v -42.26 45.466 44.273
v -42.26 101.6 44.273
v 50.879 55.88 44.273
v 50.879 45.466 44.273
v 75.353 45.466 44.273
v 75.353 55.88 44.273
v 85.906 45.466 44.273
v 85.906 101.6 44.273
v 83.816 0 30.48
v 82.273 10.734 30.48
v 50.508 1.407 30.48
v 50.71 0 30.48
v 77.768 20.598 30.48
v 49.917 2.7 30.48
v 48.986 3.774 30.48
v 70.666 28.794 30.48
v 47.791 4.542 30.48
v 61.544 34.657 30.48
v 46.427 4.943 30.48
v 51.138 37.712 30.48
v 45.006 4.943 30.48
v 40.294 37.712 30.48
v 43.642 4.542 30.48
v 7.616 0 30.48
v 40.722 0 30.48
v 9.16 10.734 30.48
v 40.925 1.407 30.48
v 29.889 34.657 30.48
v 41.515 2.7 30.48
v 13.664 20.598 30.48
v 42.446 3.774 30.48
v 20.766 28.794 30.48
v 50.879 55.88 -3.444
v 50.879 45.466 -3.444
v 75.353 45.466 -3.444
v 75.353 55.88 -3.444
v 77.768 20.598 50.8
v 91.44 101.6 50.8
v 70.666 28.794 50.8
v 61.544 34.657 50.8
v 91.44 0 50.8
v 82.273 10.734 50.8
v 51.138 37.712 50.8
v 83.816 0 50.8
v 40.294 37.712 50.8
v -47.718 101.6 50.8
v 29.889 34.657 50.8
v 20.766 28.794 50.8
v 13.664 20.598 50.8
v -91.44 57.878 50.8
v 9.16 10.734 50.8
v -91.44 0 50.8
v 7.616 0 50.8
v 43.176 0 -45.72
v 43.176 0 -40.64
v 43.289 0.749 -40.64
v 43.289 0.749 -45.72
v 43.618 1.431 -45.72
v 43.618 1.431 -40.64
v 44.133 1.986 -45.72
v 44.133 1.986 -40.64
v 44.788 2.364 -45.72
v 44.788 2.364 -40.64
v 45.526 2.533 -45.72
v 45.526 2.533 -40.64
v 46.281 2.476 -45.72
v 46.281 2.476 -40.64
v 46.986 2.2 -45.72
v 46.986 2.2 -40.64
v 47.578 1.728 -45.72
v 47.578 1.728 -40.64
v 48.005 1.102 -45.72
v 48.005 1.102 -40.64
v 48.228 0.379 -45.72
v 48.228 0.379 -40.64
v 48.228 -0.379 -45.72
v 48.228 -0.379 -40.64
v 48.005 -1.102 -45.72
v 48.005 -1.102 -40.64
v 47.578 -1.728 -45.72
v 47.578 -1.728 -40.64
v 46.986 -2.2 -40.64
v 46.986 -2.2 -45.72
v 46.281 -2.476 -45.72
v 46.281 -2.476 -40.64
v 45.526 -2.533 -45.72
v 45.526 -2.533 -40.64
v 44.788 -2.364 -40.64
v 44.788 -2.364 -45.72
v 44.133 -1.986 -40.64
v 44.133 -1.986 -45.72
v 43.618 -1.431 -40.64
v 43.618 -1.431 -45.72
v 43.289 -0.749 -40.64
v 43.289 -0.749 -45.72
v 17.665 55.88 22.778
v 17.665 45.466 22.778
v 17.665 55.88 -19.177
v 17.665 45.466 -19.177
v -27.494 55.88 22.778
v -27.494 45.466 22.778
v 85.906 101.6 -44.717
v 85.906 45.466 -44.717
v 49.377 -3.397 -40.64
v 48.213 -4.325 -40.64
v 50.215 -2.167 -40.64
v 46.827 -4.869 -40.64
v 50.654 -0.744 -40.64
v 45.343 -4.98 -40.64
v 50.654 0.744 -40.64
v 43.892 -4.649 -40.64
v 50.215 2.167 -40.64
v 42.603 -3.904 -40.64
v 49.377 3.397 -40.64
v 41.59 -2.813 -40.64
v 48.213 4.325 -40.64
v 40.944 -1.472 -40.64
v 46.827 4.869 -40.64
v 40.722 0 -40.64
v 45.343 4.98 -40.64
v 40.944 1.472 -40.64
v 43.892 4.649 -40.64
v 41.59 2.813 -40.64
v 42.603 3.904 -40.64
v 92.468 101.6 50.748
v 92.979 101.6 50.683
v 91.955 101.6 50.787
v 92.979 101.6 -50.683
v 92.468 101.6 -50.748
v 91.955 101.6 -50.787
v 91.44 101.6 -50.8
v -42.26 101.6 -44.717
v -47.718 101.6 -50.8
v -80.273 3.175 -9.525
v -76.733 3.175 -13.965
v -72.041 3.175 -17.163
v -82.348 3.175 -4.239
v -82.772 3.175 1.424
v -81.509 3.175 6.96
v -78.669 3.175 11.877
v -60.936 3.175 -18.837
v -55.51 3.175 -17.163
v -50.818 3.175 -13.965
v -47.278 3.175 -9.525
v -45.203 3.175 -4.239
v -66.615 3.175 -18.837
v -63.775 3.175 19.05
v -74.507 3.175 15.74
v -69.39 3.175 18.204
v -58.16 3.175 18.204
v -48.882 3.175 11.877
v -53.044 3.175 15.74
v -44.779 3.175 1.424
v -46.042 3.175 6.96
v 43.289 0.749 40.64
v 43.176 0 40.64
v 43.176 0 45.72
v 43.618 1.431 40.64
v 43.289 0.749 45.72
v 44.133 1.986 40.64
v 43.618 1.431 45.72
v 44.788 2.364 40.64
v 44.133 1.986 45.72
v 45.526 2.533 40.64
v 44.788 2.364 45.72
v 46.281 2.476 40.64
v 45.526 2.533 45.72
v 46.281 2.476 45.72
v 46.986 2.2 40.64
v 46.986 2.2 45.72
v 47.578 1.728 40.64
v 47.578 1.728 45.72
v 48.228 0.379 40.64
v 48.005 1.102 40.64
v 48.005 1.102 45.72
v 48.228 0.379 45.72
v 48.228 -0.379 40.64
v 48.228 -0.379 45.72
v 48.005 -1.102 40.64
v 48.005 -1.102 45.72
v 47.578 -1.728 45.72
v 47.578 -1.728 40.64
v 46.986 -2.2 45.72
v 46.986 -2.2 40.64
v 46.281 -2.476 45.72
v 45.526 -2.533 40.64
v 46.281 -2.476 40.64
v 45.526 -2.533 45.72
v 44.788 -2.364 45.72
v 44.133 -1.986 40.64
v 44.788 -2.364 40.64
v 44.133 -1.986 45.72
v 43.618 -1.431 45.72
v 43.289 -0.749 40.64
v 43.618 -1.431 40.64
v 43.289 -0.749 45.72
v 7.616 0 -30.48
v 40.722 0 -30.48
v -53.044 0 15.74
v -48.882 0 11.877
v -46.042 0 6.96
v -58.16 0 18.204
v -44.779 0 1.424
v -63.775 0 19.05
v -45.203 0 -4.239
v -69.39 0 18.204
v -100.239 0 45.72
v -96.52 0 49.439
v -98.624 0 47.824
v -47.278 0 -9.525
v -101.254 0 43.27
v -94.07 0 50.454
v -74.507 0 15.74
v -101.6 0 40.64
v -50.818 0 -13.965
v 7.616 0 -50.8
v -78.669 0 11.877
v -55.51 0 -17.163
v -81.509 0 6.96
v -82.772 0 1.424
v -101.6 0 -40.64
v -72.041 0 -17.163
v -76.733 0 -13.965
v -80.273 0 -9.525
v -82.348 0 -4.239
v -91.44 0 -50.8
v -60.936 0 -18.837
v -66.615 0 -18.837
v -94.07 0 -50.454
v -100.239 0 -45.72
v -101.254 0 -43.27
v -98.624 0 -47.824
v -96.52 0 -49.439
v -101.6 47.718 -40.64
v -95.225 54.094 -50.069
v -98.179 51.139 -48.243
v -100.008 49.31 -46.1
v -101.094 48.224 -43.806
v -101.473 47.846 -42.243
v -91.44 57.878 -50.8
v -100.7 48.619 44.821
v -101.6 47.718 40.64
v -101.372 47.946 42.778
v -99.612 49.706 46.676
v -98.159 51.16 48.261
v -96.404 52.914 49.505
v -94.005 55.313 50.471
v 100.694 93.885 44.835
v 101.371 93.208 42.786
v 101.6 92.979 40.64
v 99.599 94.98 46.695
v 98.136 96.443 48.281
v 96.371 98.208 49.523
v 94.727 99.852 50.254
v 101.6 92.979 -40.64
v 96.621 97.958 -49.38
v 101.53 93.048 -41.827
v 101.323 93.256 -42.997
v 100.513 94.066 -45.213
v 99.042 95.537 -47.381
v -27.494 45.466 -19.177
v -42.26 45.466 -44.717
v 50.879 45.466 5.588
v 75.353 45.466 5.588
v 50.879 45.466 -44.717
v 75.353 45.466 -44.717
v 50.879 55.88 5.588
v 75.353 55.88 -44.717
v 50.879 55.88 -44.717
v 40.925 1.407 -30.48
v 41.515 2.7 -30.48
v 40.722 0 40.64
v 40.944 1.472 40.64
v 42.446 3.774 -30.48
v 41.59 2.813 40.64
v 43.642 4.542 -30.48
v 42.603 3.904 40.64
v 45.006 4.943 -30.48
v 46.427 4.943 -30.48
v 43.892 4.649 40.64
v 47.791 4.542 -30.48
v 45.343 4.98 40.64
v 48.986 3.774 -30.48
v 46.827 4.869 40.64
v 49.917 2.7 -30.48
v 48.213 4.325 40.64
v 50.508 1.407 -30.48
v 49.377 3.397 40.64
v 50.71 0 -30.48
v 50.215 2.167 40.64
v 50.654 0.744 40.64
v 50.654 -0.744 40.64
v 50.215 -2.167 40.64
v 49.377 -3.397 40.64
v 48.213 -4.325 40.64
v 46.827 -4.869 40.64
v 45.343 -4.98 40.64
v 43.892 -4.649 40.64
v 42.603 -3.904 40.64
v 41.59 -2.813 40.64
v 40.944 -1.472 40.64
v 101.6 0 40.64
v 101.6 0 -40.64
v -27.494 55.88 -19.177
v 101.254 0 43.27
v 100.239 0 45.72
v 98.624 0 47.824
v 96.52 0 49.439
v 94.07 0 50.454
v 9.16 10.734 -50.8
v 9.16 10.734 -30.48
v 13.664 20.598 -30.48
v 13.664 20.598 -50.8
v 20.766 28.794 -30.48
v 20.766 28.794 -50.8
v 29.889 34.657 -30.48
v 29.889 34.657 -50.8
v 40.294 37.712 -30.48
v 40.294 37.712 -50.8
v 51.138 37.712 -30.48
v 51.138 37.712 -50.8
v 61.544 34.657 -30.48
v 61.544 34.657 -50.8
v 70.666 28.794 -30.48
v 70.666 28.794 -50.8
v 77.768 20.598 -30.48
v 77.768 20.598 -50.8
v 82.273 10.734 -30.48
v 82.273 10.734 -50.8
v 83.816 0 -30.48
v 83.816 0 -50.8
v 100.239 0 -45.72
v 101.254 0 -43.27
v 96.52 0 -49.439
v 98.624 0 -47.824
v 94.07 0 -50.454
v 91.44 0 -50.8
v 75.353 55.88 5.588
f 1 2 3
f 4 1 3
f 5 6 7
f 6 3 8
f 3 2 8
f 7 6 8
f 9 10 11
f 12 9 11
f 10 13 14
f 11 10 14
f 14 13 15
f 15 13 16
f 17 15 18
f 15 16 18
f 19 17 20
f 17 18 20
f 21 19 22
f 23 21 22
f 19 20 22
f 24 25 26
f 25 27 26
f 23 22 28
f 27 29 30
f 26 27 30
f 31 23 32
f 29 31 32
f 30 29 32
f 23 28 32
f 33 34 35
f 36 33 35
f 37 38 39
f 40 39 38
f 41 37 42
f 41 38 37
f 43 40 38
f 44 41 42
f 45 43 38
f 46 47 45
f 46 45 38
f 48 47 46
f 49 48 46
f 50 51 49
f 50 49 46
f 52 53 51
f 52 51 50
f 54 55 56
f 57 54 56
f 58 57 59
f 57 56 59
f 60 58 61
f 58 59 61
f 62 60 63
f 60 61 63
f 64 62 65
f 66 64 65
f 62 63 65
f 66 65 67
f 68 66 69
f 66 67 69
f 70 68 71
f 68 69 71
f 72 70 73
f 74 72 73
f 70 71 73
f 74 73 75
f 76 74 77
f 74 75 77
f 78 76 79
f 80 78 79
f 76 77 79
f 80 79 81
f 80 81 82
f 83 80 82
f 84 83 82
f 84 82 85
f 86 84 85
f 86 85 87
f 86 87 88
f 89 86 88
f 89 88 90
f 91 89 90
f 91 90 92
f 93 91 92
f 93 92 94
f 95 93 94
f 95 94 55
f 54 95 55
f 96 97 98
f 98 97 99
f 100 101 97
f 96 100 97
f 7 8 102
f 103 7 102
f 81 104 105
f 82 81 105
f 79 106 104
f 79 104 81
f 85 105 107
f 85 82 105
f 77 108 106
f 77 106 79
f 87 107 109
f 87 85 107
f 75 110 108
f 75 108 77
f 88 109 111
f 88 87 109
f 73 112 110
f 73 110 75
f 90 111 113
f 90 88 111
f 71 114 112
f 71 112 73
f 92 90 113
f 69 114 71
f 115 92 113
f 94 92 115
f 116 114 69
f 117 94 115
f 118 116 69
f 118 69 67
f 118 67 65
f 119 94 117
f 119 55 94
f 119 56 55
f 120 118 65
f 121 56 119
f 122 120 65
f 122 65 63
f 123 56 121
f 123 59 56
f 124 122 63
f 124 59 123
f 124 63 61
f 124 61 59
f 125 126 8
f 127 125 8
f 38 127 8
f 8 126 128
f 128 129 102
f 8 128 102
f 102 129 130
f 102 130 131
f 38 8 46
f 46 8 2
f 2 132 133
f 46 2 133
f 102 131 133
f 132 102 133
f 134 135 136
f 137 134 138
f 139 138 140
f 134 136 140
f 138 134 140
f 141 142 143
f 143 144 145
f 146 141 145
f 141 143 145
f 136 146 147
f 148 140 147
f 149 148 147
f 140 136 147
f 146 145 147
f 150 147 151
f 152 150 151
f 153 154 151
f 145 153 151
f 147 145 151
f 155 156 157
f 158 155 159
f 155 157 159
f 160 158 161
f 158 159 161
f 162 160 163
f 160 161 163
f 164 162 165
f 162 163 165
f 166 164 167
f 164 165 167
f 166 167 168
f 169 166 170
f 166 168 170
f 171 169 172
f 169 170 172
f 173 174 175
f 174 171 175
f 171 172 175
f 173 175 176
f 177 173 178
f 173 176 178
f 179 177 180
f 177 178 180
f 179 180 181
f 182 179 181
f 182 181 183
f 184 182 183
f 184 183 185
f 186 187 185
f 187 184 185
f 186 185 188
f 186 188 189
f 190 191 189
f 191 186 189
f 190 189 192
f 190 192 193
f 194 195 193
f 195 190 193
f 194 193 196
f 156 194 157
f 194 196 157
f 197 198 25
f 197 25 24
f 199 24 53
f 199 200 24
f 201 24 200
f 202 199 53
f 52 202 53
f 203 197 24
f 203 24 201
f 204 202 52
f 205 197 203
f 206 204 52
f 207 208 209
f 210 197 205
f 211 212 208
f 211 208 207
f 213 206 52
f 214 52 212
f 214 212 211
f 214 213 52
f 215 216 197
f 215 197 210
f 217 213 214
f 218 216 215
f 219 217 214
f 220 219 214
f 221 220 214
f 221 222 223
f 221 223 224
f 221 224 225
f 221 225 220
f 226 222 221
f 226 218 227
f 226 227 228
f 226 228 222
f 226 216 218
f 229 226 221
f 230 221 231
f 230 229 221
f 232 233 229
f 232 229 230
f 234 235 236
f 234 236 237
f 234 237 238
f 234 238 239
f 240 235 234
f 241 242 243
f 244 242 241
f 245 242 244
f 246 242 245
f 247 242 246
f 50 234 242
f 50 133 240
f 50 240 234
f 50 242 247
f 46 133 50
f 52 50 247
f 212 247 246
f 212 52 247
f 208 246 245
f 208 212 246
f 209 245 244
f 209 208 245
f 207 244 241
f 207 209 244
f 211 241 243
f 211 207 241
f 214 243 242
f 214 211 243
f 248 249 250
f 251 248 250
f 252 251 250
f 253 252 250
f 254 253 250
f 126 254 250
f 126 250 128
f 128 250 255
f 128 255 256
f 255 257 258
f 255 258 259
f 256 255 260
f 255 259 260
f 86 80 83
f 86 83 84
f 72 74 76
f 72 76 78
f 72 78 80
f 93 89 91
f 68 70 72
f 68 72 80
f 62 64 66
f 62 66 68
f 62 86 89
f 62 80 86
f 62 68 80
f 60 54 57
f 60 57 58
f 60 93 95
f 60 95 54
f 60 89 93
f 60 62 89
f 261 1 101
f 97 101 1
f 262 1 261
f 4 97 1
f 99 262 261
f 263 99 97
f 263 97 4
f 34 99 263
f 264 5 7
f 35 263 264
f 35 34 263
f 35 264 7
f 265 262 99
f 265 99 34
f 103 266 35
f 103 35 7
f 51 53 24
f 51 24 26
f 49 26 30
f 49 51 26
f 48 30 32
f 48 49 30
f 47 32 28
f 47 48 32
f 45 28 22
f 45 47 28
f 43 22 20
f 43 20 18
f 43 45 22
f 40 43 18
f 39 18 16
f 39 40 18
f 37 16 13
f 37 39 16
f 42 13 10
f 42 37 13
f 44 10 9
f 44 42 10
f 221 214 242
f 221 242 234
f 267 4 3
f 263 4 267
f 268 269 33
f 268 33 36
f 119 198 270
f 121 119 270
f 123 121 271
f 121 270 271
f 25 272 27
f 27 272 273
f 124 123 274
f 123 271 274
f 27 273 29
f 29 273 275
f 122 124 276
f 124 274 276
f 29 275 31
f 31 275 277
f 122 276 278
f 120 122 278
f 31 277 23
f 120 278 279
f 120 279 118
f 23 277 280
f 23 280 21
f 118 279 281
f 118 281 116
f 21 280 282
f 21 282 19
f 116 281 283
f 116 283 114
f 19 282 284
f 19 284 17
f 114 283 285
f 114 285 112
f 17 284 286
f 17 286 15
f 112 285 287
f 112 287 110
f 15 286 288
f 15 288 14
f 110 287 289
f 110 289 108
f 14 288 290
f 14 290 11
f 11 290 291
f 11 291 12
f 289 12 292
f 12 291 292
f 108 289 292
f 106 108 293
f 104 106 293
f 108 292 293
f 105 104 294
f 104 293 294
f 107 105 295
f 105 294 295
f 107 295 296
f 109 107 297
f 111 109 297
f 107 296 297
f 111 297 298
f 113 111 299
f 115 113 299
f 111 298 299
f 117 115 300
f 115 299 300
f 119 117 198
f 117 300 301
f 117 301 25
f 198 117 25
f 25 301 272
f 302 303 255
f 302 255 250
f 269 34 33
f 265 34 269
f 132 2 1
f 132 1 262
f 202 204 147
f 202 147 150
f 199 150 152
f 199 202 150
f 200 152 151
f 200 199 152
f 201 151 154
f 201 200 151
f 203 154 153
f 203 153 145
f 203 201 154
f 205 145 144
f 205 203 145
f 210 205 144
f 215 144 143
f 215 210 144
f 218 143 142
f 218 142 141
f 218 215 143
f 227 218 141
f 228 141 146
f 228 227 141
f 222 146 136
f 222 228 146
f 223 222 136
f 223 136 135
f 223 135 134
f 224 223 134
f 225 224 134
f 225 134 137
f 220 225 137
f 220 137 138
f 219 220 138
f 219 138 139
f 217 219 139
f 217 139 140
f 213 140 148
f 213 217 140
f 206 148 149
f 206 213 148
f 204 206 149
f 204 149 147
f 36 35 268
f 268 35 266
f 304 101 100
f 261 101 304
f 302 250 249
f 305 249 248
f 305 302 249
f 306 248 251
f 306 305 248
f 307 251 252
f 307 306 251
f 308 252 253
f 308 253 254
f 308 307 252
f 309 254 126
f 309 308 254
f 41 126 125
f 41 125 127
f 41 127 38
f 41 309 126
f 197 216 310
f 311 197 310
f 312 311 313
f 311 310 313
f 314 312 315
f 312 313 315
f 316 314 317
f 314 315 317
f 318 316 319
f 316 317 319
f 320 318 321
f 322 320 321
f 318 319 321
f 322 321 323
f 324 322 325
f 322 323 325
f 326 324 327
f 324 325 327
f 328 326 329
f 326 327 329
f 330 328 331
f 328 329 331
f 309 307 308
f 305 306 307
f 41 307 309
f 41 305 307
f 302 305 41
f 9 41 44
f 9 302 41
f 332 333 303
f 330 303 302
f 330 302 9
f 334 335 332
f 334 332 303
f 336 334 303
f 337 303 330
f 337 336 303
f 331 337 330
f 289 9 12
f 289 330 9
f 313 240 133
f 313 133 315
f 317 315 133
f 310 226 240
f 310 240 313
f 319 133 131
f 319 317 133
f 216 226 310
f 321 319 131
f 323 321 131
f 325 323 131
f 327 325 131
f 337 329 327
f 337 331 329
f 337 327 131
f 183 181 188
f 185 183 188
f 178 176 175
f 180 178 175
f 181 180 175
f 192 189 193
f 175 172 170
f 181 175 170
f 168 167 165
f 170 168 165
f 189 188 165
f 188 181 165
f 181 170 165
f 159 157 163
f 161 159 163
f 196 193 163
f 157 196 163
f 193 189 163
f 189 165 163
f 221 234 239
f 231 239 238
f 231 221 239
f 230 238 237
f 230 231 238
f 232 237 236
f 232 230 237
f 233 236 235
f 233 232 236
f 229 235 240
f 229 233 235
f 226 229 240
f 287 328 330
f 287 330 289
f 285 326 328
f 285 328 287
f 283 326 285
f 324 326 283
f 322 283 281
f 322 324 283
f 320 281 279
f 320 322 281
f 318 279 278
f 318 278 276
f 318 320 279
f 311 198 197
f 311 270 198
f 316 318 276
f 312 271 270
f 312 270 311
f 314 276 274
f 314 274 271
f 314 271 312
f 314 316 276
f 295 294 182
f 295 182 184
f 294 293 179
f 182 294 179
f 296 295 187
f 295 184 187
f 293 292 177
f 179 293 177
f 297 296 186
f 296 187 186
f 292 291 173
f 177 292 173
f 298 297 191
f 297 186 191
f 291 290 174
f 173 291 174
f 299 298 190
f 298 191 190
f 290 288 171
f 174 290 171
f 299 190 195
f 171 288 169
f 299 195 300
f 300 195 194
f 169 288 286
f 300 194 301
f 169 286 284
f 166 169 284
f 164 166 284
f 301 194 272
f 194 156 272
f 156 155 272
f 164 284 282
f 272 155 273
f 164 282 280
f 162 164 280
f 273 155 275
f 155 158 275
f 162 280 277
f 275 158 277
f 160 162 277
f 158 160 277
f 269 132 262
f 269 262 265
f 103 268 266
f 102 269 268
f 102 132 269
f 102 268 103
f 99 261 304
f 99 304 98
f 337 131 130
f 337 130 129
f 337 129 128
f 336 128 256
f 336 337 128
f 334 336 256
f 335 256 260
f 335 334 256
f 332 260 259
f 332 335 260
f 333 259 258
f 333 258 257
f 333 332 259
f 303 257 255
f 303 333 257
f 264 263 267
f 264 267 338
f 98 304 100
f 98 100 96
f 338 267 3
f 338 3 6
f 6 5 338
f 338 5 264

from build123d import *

# Parameters (mm, degrees)
BOSS_EXTRUDE1_DEPTH      = 101.6
SKETCH4_R                = 38.1
CUT_EXTRUDE1_DEPTH       = 20.32
BOSS_EXTRUDE3_DEPTH      = 10.16
BOSS_EXTRUDE3_DEPTH_BACK = 71.12
SKETCH5_R                = 4.993753619
BOSS_EXTRUDE4_DEPTH      = 5.08
BOSS_EXTRUDE4_DEPTH_BACK = 86.36
SKETCH6_R                = 2.54
SKETCH8_R                = 19.05
CUT_EXTRUDE2_DEPTH       = 3.175
SKETCH9_W                = 204.446341232
SKETCH9_H                = 212.005576541
CUT_EXTRUDE3_DEPTH       = 38.1
SKETCH10_W               = 191.95217793
SKETCH10_H               = 158.555264397
CUT_EXTRUDE4_DEPTH       = 6.096
SKETCH11_W               = 128.165166247
SKETCH11_H               = 88.990153167
CUT_EXTRUDE5_DEPTH       = 56.134
SKETCH12_W               = 45.159356145
SKETCH12_H               = 41.954498612
SKETCH12_W_2             = 24.473457524
SKETCH12_H_2             = 41.272764935
SKETCH12_H_3             = 38.685517003
BOSS_EXTRUDE5_DEPTH      = 10.414


with BuildPart() as part:
    # Sketch1 → Boss-Extrude1 (new body)
    with BuildSketch(Plane(origin=(0, 0, 0), x_dir=(1, 0, 0), z_dir=(0, 1, 0))):
        with BuildLine():
            Line((-91.44, 50.8), (91.44, 50.8))
            ThreePointArc((91.44, 50.8), (98.624204897, 47.824204897), (101.6, 40.64))
            Line((101.6, 40.64), (101.6, -40.64))
            ThreePointArc((101.6, -40.64), (98.624204897, -47.824204897), (91.44, -50.8))
            Line((91.44, -50.8), (-91.44, -50.8))
            ThreePointArc((-91.44, -50.8), (-98.624204897, -47.824204897), (-101.6, -40.64))
            Line((-101.6, -40.64), (-101.6, 40.64))
            ThreePointArc((-101.6, 40.64), (-98.624204897, 47.824204897), (-91.44, 50.8))
        make_face()
    extrude(amount=BOSS_EXTRUDE1_DEPTH)

    # Sketch4 → Cut-Extrude1 (cut)
    with BuildSketch(Plane(origin=(0, 0, -50.8), x_dir=(-1, 0, 0), z_dir=(0, 0, -1))):
        with Locations((-45.716232369, 0)):
            Circle(SKETCH4_R)
    cut_extrude1 = extrude(amount=-CUT_EXTRUDE1_DEPTH, mode=Mode.SUBTRACT)

    # Mirror1: Cut-Extrude1 across plane
    add(cut_extrude1.mirror(Plane.XY), mode=Mode.SUBTRACT)

    # Sketch5 → Boss-Extrude3 (add, two sides: drawn at the far end of the back side and taken through both)
    with BuildSketch(Plane(origin=(0, 0, -30.48), x_dir=(-1, 0, 0), z_dir=(0, 0, -1)).offset(-BOSS_EXTRUDE3_DEPTH_BACK)):
        with Locations((-45.716232369, 0)):
            Circle(SKETCH5_R)
    extrude(amount=BOSS_EXTRUDE3_DEPTH + BOSS_EXTRUDE3_DEPTH_BACK)

    # Sketch6 → Boss-Extrude4 (add, two sides: drawn at the far end of the back side and taken through both)
    with BuildSketch(Plane(origin=(0, 0, -40.64), x_dir=(-1, 0, 0), z_dir=(0, 0, -1)).offset(-BOSS_EXTRUDE4_DEPTH_BACK)):
        with Locations((-45.716232369, 0)):
            Circle(SKETCH6_R)
    extrude(amount=BOSS_EXTRUDE4_DEPTH + BOSS_EXTRUDE4_DEPTH_BACK)

    # Sketch8 → Cut-Extrude2 (cut)
    with BuildSketch(Plane(origin=(0, 0, 0), x_dir=(1, 0, 0), z_dir=(0, 1, 0))):
        with Locations(Location((-63.77539901, 0, 0), (0, 0, 270))):
            Circle(SKETCH8_R)
    extrude(amount=CUT_EXTRUDE2_DEPTH, mode=Mode.SUBTRACT)

    # Sketch9 → Cut-Extrude3 (cut)
    with BuildSketch(Plane(origin=(-101.6, 101.6, 0), x_dir=(0, 0, 1), z_dir=(-0.7071067811865512, 0.7071067811865438, 0))):
        with Locations((0, 45.254668325)):
            Rectangle(SKETCH9_W, SKETCH9_H)
    extrude(amount=-CUT_EXTRUDE3_DEPTH, mode=Mode.SUBTRACT)

    # Sketch10 → Cut-Extrude4 (cut)
    with BuildSketch(Plane(origin=(101.6, 101.6, 0), x_dir=(0, 0, -1), z_dir=(-0.7071067811865512, -0.7071067811865438, 0))):
        with Locations((0, 44.355551834)):
            Rectangle(SKETCH10_W, SKETCH10_H)
    extrude(amount=CUT_EXTRUDE4_DEPTH, mode=Mode.SUBTRACT)

    # Sketch11 → Cut-Extrude5 (cut)
    with BuildSketch(Plane(origin=(0, 101.6, 0), x_dir=(1, 0, 0), z_dir=(0, 1, 0))):
        with Locations((21.822922161, 0.221645033)):
            Rectangle(SKETCH11_W, SKETCH11_H)
    extrude(amount=-CUT_EXTRUDE5_DEPTH, mode=Mode.SUBTRACT)

    # Sketch12 → Boss-Extrude5 (add)
    with BuildSketch(Plane(origin=(0, 45.466, 0), x_dir=(1, 0, 0), z_dir=(0, 1, 0))):
        with Locations((-4.914184507, -1.800355644)):
            Rectangle(SKETCH12_W, SKETCH12_H)
        with Locations((63.116200395, 24.08033915)):
            Rectangle(SKETCH12_W_2, SKETCH12_H_2)
        with Locations((63.116200395, -24.930673049)):
            Rectangle(SKETCH12_W_2, SKETCH12_H_3)
    extrude(amount=BOSS_EXTRUDE5_DEPTH)


solid = part.part
